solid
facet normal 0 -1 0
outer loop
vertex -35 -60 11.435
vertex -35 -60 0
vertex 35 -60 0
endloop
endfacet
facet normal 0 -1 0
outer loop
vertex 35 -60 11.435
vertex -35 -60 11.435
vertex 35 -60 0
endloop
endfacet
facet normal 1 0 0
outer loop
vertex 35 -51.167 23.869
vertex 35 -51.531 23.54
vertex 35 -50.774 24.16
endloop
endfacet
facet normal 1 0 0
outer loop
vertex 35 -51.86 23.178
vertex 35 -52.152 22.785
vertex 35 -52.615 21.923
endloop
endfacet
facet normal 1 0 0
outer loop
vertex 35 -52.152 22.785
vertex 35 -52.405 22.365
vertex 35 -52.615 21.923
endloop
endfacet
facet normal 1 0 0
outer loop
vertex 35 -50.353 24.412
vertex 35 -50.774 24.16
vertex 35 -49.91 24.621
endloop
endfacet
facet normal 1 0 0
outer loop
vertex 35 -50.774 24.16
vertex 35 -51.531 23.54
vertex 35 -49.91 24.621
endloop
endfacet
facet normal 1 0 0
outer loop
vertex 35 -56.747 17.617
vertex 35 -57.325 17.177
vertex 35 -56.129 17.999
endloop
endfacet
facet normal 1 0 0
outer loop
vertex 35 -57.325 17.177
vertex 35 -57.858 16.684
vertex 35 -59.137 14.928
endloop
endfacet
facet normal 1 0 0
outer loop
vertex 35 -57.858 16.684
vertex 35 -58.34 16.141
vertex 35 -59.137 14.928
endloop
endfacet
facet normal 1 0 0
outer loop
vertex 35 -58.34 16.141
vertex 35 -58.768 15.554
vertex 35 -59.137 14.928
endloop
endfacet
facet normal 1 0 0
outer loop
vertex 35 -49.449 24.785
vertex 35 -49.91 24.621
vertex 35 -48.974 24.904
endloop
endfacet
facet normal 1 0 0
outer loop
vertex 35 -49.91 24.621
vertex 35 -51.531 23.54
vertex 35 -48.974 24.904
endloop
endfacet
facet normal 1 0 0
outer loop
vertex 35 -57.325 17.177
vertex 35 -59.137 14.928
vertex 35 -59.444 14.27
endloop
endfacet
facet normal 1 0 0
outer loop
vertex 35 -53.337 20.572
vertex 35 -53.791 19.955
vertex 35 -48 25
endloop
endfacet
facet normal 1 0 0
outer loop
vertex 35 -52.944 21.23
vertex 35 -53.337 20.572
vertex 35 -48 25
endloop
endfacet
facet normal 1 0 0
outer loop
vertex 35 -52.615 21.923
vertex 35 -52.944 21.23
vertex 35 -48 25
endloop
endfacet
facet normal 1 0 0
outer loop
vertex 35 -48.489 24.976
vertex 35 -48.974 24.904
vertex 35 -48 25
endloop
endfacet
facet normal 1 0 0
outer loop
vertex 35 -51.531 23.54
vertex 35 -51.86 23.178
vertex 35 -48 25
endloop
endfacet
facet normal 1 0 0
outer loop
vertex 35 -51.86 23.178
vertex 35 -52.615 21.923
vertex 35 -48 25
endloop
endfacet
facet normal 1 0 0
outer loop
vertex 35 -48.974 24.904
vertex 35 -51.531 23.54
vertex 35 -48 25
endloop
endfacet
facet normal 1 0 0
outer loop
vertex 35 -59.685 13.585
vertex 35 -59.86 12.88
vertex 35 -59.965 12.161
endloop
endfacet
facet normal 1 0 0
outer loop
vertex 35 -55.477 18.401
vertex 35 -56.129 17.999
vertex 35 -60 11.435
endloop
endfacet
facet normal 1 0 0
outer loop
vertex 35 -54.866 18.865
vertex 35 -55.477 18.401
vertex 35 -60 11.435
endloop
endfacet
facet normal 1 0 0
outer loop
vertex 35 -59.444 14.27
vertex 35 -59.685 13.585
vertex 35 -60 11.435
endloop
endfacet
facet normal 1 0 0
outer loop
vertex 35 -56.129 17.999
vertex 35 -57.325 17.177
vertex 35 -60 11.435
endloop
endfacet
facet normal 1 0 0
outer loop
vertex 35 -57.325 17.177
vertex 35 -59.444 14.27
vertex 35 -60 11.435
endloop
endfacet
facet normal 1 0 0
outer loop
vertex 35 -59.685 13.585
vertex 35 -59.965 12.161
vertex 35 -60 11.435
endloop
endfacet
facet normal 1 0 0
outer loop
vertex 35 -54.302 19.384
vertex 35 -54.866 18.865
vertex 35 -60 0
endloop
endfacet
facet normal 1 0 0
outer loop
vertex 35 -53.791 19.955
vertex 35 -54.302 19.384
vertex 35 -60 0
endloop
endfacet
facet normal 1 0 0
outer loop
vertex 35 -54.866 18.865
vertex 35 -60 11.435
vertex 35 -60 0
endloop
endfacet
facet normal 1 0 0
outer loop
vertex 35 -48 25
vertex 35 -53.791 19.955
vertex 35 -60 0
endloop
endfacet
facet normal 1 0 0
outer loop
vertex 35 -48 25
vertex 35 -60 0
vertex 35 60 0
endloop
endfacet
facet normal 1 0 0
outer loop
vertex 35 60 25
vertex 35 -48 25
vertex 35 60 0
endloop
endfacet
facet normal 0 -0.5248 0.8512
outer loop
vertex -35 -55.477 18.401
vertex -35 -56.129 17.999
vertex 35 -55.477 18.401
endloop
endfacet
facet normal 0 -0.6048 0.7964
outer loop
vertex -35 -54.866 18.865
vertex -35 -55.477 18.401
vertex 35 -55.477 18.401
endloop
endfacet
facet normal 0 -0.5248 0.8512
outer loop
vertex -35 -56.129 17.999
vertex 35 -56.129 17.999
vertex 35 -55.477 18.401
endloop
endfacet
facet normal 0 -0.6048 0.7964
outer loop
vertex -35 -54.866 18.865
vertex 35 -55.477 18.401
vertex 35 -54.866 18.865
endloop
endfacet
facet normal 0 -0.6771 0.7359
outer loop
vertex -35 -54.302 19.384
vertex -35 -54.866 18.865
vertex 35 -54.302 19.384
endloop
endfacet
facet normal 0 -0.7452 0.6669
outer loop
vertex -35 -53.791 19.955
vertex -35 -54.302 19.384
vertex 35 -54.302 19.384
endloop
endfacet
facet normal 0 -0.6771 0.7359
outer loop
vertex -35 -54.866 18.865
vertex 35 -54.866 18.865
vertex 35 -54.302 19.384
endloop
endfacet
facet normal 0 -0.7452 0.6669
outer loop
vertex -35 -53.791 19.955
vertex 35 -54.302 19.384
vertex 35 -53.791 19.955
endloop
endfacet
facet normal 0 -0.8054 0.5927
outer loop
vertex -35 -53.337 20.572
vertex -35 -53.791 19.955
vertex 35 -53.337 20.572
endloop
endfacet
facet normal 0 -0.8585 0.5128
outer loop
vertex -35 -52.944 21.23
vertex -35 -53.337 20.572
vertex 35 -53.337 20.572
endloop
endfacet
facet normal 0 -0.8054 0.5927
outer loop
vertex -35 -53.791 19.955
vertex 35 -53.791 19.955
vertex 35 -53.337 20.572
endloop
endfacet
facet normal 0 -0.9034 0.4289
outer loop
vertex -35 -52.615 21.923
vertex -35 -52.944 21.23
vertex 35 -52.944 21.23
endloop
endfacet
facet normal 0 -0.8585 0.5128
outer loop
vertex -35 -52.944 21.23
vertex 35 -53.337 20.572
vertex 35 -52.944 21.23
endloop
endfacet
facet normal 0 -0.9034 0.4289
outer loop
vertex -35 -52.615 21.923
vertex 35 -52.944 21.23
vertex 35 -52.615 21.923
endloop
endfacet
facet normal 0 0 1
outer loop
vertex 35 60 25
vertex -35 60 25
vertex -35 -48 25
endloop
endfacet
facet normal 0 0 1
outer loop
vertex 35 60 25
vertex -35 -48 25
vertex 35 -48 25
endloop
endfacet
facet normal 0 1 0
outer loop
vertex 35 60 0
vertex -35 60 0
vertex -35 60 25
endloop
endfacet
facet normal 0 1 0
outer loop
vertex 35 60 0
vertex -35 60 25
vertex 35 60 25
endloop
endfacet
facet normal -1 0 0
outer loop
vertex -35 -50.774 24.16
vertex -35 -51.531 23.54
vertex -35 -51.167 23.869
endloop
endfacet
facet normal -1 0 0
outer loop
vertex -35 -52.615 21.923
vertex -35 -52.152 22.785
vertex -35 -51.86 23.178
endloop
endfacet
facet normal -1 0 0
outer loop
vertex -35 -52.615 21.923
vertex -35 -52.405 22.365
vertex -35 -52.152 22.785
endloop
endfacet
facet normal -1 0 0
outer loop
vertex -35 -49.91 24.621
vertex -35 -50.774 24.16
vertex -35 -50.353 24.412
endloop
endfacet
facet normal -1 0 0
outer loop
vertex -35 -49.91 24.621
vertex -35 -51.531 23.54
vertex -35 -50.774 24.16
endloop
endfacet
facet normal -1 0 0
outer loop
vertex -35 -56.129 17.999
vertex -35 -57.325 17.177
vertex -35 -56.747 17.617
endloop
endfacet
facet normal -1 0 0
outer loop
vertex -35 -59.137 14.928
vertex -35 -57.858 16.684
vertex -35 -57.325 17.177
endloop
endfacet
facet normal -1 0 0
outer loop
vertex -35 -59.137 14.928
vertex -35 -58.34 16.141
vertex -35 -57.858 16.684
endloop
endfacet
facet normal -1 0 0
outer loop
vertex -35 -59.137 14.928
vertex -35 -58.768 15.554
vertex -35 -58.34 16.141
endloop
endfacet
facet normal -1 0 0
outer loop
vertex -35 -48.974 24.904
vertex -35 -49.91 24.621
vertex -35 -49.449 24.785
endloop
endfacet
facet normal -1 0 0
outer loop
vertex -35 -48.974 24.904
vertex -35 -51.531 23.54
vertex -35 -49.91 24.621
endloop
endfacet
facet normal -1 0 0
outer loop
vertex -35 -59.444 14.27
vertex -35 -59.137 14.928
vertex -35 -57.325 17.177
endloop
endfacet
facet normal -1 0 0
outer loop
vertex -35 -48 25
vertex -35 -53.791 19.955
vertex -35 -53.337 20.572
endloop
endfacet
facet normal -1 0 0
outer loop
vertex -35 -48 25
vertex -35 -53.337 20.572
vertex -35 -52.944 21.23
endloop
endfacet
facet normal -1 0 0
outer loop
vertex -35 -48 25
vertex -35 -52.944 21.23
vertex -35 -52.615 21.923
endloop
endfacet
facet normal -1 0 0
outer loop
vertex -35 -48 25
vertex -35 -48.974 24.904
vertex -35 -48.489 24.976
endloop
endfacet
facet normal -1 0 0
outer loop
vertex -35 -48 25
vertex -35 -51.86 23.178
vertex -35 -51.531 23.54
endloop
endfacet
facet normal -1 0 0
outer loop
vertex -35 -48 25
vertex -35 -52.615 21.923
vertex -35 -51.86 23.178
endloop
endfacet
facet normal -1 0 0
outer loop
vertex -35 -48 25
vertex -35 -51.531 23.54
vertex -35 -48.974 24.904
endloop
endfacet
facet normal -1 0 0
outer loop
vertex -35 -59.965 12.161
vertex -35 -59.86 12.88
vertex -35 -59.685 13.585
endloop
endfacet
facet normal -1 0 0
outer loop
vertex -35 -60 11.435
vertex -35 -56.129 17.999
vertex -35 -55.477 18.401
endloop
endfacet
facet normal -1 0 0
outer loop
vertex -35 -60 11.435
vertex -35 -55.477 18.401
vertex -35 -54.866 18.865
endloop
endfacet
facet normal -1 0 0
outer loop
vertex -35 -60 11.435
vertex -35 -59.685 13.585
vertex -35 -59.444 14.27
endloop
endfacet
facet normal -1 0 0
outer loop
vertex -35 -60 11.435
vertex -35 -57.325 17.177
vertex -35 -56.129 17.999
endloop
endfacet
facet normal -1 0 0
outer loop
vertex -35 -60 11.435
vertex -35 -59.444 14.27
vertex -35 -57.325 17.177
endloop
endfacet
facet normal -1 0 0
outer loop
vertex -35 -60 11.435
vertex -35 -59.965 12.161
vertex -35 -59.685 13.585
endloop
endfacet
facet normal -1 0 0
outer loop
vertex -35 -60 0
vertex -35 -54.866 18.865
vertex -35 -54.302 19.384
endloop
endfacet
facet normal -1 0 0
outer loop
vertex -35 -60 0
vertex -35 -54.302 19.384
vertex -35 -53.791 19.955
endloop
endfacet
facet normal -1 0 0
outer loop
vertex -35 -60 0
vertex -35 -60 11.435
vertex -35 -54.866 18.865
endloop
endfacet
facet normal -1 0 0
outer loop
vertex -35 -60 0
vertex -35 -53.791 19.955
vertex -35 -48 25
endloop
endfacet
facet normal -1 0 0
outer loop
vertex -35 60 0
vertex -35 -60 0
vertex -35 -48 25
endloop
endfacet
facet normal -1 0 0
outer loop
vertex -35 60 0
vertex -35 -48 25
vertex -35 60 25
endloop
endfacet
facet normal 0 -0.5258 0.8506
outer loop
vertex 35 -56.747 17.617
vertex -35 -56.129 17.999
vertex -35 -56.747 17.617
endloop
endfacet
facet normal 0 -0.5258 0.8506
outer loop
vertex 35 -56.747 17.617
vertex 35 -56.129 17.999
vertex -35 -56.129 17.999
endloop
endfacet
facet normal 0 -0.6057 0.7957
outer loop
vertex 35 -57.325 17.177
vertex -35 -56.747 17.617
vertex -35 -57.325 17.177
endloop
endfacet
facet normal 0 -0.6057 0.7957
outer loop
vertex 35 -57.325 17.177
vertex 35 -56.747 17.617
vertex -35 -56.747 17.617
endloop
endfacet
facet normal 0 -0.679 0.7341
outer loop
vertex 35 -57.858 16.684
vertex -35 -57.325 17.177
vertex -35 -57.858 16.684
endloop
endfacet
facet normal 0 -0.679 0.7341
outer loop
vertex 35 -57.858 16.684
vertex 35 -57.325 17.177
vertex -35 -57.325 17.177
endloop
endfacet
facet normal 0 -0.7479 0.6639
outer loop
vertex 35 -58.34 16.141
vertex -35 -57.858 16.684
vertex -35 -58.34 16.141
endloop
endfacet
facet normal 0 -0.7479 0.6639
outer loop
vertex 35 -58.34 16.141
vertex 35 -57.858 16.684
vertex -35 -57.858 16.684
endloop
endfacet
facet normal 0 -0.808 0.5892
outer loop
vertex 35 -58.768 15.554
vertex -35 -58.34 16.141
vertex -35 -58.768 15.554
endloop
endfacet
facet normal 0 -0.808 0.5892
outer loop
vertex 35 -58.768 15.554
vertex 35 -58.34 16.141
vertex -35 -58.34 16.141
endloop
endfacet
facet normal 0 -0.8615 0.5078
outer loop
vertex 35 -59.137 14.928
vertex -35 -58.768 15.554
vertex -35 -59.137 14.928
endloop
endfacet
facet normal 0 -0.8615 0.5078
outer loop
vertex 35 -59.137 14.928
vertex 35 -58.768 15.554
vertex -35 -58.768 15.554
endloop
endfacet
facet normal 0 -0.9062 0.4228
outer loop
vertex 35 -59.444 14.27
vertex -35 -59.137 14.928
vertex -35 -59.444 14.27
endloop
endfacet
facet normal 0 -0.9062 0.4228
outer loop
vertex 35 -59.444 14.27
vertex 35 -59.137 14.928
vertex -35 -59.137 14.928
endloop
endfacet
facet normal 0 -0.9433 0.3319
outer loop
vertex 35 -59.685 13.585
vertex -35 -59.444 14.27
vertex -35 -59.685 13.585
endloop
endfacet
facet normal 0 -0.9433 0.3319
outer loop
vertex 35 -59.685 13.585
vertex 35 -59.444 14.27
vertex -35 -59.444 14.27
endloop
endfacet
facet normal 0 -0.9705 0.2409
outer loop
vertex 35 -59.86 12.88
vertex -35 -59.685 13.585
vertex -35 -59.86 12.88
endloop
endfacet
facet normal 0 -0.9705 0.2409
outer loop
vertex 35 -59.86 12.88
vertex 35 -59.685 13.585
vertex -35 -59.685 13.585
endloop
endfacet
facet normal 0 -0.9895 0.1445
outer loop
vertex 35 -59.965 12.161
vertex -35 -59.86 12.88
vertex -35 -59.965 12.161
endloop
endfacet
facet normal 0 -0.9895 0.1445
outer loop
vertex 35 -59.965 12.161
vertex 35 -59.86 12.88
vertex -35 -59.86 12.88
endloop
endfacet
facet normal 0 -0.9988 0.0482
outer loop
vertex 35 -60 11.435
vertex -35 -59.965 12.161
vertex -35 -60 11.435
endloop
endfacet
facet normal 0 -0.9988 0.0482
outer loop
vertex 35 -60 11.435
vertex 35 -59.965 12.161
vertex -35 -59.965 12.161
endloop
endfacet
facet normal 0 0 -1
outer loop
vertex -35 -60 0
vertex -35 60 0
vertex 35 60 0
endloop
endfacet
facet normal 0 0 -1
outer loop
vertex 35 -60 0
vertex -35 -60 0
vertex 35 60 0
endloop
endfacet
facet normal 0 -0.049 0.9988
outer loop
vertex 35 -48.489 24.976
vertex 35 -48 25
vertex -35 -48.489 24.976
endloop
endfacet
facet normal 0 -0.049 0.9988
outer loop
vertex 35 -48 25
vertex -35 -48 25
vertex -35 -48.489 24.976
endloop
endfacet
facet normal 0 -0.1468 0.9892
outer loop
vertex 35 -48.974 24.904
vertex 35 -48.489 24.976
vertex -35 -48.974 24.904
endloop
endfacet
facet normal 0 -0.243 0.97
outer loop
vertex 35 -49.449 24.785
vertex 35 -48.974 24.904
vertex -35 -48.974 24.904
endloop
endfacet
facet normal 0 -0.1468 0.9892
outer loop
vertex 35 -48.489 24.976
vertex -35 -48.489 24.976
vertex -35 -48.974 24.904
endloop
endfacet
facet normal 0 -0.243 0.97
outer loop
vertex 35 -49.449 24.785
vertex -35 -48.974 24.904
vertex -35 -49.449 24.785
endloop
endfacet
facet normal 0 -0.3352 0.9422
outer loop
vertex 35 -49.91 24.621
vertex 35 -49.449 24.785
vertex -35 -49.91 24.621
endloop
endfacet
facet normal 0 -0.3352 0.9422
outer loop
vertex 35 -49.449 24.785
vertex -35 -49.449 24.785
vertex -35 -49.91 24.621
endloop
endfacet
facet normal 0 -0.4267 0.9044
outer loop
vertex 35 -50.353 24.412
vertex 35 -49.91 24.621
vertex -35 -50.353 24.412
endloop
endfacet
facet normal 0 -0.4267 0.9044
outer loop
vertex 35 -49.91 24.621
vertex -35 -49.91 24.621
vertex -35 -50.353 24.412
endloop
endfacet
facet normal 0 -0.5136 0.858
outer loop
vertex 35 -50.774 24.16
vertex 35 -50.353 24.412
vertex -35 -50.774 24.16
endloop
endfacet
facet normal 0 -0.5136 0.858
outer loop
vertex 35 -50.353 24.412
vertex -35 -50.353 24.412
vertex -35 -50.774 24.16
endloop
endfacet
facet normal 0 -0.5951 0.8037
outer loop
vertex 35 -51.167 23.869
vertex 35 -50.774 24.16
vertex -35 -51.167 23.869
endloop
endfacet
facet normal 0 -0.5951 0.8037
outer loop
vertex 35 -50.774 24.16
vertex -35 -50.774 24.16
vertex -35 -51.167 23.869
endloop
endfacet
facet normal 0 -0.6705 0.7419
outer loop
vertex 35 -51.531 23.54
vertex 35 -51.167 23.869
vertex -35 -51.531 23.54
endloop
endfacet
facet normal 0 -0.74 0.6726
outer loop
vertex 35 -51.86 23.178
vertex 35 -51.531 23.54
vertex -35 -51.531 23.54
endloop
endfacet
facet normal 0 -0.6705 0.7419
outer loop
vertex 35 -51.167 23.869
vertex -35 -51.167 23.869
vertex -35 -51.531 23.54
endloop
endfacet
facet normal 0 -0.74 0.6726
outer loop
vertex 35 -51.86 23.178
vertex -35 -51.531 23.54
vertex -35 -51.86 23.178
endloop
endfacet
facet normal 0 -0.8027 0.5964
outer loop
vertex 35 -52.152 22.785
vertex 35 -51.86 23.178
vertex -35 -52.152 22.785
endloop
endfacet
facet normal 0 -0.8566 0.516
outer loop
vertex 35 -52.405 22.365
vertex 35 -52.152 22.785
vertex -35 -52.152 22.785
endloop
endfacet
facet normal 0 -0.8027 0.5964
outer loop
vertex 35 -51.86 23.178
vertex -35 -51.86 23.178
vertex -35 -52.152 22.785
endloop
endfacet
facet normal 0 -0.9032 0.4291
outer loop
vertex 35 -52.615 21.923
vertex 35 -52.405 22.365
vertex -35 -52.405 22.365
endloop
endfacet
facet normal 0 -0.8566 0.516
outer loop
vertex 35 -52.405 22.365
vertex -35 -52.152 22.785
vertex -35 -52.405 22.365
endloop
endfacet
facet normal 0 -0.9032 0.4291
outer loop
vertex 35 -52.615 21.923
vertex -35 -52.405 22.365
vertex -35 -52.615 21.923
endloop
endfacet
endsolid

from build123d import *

# Parameters (mm, degrees)
F0_W     = 70
F0_H     = 120
F1_DEPTH = 25
F2_R     = 8
F3_DEPTH = 70
F4_R     = 5
F5_R     = 7.5


with BuildPart() as f1:
    # F0 (on Top) → F1 (new body)
    with BuildSketch(Plane.XY):
        Rectangle(F0_W, F0_H)
    extrude(amount=F1_DEPTH)

    # F2 (on face) → F3 (cut, through all)
    with BuildSketch(Plane.YZ.offset(35)):
        with Locations((-60, 25)):
            Circle(F2_R)
    extrude(amount=-F3_DEPTH, mode=Mode.SUBTRACT)

    # F4
    f4_edges = [f1.edges().sort_by_distance(p)[0] for p in [
        (0, -52, 25),
    ]]
    fillet(f4_edges, radius=F4_R)

    # F5
    f5_edges = [f1.edges().sort_by_distance(p)[0] for p in [
        (0, -60, 17),
    ]]
    fillet(f5_edges, radius=F5_R)


solid = f1.part
